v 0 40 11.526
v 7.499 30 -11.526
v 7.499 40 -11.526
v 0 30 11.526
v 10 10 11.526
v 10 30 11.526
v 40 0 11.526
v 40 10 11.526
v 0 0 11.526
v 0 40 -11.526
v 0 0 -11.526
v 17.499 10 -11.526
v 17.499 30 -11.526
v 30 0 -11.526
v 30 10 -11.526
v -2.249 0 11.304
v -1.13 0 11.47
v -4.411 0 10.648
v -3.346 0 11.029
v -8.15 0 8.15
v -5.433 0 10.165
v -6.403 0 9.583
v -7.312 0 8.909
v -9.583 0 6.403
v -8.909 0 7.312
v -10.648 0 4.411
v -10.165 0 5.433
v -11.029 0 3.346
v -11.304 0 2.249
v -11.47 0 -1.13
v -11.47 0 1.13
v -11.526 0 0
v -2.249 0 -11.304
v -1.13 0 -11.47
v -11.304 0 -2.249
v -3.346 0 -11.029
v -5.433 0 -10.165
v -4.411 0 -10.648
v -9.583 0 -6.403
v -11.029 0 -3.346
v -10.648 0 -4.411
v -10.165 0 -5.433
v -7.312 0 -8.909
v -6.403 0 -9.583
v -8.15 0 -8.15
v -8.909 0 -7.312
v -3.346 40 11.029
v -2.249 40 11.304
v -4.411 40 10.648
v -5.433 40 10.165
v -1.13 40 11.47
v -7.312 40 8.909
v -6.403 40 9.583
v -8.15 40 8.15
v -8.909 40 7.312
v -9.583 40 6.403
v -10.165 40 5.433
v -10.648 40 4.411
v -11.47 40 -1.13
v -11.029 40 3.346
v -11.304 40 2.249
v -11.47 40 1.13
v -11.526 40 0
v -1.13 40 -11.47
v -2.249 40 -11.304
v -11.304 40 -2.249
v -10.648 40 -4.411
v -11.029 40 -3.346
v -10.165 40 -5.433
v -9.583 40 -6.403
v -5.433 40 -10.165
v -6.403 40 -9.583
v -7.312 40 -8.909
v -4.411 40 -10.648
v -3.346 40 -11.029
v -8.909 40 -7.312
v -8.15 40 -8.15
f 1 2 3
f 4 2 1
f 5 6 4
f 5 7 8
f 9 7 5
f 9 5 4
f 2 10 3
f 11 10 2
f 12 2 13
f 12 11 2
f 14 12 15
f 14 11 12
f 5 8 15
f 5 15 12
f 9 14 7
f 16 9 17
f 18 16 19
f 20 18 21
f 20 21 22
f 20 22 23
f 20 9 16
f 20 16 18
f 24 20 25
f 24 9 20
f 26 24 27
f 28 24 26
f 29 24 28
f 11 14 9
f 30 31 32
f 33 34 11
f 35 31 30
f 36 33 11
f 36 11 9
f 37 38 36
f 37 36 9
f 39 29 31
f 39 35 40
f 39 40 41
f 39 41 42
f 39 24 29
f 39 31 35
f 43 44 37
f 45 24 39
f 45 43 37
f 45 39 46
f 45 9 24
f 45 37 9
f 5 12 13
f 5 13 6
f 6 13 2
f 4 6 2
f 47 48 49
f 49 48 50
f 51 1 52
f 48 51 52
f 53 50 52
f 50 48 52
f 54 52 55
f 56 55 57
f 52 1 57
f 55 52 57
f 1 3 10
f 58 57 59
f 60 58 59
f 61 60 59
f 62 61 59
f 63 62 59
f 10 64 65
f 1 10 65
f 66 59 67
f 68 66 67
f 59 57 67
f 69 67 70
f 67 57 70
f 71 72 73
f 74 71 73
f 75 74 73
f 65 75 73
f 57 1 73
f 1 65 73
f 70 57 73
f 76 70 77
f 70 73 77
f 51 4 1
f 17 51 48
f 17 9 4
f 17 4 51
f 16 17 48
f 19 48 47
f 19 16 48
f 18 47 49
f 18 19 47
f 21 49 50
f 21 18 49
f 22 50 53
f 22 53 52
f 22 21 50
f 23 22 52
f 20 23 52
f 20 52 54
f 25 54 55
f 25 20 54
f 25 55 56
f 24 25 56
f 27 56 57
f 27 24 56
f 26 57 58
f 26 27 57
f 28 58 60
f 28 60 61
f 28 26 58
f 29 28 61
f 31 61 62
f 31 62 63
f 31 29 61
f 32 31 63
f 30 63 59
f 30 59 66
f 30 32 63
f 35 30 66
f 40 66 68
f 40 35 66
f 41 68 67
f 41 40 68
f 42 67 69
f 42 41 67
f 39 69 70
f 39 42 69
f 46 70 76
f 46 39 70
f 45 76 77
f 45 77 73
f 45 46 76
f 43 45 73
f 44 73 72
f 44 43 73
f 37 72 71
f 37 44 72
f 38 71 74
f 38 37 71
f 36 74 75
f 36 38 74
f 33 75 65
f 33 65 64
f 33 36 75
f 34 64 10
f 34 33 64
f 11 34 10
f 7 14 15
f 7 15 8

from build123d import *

# Parameters (mm, degrees)
BOSS_EXTRUDE1_DEPTH = 10
BOSS_EXTRUDE2_DEPTH = 20
BOSS_EXTRUDE3_DEPTH = 30


with BuildPart() as part:
    # Sketch1 → Boss-Extrude1 (new body)
    with BuildSketch(Plane(origin=(0, 0, 0), x_dir=(1, 0, 0), z_dir=(0, 1, 0))):
        with BuildLine():
            Line((0, 11.52564913), (30, 11.52564913))
            Line((30, 11.52564913), (40, -11.52564913))
            Line((40, -11.52564913), (0, -11.52564913))
            ThreePointArc((0, -11.52564913), (-11.52564913, 0), (0, 11.52564913))
        make_face()
    extrude(amount=BOSS_EXTRUDE1_DEPTH)

    # Sketch2 → Boss-Extrude2 (add)
    with BuildSketch(Plane(origin=(0, 10, 0), x_dir=(1, 0, 0), z_dir=(0, 1, 0))):
        Polygon((7.498547434, 11.52564913), (17.498547434, 11.52564913), (10, -11.52564913), (0, -11.52564913), align=None)
    extrude(amount=BOSS_EXTRUDE2_DEPTH)

    # Sketch3 → Boss-Extrude3 (add)
    with BuildSketch(Plane(origin=(0, 10, 0), x_dir=(1, 0, 0), z_dir=(0, 1, 0))):
        with BuildLine():
            Line((0, 11.52564913), (7.498547434, 11.52564913))
            Line((7.498547434, 11.52564913), (0, -11.52564913))
            ThreePointArc((0, -11.52564913), (-11.52564913, 0), (0, 11.52564913))
        make_face()
    extrude(amount=BOSS_EXTRUDE3_DEPTH)


solid = part.part
